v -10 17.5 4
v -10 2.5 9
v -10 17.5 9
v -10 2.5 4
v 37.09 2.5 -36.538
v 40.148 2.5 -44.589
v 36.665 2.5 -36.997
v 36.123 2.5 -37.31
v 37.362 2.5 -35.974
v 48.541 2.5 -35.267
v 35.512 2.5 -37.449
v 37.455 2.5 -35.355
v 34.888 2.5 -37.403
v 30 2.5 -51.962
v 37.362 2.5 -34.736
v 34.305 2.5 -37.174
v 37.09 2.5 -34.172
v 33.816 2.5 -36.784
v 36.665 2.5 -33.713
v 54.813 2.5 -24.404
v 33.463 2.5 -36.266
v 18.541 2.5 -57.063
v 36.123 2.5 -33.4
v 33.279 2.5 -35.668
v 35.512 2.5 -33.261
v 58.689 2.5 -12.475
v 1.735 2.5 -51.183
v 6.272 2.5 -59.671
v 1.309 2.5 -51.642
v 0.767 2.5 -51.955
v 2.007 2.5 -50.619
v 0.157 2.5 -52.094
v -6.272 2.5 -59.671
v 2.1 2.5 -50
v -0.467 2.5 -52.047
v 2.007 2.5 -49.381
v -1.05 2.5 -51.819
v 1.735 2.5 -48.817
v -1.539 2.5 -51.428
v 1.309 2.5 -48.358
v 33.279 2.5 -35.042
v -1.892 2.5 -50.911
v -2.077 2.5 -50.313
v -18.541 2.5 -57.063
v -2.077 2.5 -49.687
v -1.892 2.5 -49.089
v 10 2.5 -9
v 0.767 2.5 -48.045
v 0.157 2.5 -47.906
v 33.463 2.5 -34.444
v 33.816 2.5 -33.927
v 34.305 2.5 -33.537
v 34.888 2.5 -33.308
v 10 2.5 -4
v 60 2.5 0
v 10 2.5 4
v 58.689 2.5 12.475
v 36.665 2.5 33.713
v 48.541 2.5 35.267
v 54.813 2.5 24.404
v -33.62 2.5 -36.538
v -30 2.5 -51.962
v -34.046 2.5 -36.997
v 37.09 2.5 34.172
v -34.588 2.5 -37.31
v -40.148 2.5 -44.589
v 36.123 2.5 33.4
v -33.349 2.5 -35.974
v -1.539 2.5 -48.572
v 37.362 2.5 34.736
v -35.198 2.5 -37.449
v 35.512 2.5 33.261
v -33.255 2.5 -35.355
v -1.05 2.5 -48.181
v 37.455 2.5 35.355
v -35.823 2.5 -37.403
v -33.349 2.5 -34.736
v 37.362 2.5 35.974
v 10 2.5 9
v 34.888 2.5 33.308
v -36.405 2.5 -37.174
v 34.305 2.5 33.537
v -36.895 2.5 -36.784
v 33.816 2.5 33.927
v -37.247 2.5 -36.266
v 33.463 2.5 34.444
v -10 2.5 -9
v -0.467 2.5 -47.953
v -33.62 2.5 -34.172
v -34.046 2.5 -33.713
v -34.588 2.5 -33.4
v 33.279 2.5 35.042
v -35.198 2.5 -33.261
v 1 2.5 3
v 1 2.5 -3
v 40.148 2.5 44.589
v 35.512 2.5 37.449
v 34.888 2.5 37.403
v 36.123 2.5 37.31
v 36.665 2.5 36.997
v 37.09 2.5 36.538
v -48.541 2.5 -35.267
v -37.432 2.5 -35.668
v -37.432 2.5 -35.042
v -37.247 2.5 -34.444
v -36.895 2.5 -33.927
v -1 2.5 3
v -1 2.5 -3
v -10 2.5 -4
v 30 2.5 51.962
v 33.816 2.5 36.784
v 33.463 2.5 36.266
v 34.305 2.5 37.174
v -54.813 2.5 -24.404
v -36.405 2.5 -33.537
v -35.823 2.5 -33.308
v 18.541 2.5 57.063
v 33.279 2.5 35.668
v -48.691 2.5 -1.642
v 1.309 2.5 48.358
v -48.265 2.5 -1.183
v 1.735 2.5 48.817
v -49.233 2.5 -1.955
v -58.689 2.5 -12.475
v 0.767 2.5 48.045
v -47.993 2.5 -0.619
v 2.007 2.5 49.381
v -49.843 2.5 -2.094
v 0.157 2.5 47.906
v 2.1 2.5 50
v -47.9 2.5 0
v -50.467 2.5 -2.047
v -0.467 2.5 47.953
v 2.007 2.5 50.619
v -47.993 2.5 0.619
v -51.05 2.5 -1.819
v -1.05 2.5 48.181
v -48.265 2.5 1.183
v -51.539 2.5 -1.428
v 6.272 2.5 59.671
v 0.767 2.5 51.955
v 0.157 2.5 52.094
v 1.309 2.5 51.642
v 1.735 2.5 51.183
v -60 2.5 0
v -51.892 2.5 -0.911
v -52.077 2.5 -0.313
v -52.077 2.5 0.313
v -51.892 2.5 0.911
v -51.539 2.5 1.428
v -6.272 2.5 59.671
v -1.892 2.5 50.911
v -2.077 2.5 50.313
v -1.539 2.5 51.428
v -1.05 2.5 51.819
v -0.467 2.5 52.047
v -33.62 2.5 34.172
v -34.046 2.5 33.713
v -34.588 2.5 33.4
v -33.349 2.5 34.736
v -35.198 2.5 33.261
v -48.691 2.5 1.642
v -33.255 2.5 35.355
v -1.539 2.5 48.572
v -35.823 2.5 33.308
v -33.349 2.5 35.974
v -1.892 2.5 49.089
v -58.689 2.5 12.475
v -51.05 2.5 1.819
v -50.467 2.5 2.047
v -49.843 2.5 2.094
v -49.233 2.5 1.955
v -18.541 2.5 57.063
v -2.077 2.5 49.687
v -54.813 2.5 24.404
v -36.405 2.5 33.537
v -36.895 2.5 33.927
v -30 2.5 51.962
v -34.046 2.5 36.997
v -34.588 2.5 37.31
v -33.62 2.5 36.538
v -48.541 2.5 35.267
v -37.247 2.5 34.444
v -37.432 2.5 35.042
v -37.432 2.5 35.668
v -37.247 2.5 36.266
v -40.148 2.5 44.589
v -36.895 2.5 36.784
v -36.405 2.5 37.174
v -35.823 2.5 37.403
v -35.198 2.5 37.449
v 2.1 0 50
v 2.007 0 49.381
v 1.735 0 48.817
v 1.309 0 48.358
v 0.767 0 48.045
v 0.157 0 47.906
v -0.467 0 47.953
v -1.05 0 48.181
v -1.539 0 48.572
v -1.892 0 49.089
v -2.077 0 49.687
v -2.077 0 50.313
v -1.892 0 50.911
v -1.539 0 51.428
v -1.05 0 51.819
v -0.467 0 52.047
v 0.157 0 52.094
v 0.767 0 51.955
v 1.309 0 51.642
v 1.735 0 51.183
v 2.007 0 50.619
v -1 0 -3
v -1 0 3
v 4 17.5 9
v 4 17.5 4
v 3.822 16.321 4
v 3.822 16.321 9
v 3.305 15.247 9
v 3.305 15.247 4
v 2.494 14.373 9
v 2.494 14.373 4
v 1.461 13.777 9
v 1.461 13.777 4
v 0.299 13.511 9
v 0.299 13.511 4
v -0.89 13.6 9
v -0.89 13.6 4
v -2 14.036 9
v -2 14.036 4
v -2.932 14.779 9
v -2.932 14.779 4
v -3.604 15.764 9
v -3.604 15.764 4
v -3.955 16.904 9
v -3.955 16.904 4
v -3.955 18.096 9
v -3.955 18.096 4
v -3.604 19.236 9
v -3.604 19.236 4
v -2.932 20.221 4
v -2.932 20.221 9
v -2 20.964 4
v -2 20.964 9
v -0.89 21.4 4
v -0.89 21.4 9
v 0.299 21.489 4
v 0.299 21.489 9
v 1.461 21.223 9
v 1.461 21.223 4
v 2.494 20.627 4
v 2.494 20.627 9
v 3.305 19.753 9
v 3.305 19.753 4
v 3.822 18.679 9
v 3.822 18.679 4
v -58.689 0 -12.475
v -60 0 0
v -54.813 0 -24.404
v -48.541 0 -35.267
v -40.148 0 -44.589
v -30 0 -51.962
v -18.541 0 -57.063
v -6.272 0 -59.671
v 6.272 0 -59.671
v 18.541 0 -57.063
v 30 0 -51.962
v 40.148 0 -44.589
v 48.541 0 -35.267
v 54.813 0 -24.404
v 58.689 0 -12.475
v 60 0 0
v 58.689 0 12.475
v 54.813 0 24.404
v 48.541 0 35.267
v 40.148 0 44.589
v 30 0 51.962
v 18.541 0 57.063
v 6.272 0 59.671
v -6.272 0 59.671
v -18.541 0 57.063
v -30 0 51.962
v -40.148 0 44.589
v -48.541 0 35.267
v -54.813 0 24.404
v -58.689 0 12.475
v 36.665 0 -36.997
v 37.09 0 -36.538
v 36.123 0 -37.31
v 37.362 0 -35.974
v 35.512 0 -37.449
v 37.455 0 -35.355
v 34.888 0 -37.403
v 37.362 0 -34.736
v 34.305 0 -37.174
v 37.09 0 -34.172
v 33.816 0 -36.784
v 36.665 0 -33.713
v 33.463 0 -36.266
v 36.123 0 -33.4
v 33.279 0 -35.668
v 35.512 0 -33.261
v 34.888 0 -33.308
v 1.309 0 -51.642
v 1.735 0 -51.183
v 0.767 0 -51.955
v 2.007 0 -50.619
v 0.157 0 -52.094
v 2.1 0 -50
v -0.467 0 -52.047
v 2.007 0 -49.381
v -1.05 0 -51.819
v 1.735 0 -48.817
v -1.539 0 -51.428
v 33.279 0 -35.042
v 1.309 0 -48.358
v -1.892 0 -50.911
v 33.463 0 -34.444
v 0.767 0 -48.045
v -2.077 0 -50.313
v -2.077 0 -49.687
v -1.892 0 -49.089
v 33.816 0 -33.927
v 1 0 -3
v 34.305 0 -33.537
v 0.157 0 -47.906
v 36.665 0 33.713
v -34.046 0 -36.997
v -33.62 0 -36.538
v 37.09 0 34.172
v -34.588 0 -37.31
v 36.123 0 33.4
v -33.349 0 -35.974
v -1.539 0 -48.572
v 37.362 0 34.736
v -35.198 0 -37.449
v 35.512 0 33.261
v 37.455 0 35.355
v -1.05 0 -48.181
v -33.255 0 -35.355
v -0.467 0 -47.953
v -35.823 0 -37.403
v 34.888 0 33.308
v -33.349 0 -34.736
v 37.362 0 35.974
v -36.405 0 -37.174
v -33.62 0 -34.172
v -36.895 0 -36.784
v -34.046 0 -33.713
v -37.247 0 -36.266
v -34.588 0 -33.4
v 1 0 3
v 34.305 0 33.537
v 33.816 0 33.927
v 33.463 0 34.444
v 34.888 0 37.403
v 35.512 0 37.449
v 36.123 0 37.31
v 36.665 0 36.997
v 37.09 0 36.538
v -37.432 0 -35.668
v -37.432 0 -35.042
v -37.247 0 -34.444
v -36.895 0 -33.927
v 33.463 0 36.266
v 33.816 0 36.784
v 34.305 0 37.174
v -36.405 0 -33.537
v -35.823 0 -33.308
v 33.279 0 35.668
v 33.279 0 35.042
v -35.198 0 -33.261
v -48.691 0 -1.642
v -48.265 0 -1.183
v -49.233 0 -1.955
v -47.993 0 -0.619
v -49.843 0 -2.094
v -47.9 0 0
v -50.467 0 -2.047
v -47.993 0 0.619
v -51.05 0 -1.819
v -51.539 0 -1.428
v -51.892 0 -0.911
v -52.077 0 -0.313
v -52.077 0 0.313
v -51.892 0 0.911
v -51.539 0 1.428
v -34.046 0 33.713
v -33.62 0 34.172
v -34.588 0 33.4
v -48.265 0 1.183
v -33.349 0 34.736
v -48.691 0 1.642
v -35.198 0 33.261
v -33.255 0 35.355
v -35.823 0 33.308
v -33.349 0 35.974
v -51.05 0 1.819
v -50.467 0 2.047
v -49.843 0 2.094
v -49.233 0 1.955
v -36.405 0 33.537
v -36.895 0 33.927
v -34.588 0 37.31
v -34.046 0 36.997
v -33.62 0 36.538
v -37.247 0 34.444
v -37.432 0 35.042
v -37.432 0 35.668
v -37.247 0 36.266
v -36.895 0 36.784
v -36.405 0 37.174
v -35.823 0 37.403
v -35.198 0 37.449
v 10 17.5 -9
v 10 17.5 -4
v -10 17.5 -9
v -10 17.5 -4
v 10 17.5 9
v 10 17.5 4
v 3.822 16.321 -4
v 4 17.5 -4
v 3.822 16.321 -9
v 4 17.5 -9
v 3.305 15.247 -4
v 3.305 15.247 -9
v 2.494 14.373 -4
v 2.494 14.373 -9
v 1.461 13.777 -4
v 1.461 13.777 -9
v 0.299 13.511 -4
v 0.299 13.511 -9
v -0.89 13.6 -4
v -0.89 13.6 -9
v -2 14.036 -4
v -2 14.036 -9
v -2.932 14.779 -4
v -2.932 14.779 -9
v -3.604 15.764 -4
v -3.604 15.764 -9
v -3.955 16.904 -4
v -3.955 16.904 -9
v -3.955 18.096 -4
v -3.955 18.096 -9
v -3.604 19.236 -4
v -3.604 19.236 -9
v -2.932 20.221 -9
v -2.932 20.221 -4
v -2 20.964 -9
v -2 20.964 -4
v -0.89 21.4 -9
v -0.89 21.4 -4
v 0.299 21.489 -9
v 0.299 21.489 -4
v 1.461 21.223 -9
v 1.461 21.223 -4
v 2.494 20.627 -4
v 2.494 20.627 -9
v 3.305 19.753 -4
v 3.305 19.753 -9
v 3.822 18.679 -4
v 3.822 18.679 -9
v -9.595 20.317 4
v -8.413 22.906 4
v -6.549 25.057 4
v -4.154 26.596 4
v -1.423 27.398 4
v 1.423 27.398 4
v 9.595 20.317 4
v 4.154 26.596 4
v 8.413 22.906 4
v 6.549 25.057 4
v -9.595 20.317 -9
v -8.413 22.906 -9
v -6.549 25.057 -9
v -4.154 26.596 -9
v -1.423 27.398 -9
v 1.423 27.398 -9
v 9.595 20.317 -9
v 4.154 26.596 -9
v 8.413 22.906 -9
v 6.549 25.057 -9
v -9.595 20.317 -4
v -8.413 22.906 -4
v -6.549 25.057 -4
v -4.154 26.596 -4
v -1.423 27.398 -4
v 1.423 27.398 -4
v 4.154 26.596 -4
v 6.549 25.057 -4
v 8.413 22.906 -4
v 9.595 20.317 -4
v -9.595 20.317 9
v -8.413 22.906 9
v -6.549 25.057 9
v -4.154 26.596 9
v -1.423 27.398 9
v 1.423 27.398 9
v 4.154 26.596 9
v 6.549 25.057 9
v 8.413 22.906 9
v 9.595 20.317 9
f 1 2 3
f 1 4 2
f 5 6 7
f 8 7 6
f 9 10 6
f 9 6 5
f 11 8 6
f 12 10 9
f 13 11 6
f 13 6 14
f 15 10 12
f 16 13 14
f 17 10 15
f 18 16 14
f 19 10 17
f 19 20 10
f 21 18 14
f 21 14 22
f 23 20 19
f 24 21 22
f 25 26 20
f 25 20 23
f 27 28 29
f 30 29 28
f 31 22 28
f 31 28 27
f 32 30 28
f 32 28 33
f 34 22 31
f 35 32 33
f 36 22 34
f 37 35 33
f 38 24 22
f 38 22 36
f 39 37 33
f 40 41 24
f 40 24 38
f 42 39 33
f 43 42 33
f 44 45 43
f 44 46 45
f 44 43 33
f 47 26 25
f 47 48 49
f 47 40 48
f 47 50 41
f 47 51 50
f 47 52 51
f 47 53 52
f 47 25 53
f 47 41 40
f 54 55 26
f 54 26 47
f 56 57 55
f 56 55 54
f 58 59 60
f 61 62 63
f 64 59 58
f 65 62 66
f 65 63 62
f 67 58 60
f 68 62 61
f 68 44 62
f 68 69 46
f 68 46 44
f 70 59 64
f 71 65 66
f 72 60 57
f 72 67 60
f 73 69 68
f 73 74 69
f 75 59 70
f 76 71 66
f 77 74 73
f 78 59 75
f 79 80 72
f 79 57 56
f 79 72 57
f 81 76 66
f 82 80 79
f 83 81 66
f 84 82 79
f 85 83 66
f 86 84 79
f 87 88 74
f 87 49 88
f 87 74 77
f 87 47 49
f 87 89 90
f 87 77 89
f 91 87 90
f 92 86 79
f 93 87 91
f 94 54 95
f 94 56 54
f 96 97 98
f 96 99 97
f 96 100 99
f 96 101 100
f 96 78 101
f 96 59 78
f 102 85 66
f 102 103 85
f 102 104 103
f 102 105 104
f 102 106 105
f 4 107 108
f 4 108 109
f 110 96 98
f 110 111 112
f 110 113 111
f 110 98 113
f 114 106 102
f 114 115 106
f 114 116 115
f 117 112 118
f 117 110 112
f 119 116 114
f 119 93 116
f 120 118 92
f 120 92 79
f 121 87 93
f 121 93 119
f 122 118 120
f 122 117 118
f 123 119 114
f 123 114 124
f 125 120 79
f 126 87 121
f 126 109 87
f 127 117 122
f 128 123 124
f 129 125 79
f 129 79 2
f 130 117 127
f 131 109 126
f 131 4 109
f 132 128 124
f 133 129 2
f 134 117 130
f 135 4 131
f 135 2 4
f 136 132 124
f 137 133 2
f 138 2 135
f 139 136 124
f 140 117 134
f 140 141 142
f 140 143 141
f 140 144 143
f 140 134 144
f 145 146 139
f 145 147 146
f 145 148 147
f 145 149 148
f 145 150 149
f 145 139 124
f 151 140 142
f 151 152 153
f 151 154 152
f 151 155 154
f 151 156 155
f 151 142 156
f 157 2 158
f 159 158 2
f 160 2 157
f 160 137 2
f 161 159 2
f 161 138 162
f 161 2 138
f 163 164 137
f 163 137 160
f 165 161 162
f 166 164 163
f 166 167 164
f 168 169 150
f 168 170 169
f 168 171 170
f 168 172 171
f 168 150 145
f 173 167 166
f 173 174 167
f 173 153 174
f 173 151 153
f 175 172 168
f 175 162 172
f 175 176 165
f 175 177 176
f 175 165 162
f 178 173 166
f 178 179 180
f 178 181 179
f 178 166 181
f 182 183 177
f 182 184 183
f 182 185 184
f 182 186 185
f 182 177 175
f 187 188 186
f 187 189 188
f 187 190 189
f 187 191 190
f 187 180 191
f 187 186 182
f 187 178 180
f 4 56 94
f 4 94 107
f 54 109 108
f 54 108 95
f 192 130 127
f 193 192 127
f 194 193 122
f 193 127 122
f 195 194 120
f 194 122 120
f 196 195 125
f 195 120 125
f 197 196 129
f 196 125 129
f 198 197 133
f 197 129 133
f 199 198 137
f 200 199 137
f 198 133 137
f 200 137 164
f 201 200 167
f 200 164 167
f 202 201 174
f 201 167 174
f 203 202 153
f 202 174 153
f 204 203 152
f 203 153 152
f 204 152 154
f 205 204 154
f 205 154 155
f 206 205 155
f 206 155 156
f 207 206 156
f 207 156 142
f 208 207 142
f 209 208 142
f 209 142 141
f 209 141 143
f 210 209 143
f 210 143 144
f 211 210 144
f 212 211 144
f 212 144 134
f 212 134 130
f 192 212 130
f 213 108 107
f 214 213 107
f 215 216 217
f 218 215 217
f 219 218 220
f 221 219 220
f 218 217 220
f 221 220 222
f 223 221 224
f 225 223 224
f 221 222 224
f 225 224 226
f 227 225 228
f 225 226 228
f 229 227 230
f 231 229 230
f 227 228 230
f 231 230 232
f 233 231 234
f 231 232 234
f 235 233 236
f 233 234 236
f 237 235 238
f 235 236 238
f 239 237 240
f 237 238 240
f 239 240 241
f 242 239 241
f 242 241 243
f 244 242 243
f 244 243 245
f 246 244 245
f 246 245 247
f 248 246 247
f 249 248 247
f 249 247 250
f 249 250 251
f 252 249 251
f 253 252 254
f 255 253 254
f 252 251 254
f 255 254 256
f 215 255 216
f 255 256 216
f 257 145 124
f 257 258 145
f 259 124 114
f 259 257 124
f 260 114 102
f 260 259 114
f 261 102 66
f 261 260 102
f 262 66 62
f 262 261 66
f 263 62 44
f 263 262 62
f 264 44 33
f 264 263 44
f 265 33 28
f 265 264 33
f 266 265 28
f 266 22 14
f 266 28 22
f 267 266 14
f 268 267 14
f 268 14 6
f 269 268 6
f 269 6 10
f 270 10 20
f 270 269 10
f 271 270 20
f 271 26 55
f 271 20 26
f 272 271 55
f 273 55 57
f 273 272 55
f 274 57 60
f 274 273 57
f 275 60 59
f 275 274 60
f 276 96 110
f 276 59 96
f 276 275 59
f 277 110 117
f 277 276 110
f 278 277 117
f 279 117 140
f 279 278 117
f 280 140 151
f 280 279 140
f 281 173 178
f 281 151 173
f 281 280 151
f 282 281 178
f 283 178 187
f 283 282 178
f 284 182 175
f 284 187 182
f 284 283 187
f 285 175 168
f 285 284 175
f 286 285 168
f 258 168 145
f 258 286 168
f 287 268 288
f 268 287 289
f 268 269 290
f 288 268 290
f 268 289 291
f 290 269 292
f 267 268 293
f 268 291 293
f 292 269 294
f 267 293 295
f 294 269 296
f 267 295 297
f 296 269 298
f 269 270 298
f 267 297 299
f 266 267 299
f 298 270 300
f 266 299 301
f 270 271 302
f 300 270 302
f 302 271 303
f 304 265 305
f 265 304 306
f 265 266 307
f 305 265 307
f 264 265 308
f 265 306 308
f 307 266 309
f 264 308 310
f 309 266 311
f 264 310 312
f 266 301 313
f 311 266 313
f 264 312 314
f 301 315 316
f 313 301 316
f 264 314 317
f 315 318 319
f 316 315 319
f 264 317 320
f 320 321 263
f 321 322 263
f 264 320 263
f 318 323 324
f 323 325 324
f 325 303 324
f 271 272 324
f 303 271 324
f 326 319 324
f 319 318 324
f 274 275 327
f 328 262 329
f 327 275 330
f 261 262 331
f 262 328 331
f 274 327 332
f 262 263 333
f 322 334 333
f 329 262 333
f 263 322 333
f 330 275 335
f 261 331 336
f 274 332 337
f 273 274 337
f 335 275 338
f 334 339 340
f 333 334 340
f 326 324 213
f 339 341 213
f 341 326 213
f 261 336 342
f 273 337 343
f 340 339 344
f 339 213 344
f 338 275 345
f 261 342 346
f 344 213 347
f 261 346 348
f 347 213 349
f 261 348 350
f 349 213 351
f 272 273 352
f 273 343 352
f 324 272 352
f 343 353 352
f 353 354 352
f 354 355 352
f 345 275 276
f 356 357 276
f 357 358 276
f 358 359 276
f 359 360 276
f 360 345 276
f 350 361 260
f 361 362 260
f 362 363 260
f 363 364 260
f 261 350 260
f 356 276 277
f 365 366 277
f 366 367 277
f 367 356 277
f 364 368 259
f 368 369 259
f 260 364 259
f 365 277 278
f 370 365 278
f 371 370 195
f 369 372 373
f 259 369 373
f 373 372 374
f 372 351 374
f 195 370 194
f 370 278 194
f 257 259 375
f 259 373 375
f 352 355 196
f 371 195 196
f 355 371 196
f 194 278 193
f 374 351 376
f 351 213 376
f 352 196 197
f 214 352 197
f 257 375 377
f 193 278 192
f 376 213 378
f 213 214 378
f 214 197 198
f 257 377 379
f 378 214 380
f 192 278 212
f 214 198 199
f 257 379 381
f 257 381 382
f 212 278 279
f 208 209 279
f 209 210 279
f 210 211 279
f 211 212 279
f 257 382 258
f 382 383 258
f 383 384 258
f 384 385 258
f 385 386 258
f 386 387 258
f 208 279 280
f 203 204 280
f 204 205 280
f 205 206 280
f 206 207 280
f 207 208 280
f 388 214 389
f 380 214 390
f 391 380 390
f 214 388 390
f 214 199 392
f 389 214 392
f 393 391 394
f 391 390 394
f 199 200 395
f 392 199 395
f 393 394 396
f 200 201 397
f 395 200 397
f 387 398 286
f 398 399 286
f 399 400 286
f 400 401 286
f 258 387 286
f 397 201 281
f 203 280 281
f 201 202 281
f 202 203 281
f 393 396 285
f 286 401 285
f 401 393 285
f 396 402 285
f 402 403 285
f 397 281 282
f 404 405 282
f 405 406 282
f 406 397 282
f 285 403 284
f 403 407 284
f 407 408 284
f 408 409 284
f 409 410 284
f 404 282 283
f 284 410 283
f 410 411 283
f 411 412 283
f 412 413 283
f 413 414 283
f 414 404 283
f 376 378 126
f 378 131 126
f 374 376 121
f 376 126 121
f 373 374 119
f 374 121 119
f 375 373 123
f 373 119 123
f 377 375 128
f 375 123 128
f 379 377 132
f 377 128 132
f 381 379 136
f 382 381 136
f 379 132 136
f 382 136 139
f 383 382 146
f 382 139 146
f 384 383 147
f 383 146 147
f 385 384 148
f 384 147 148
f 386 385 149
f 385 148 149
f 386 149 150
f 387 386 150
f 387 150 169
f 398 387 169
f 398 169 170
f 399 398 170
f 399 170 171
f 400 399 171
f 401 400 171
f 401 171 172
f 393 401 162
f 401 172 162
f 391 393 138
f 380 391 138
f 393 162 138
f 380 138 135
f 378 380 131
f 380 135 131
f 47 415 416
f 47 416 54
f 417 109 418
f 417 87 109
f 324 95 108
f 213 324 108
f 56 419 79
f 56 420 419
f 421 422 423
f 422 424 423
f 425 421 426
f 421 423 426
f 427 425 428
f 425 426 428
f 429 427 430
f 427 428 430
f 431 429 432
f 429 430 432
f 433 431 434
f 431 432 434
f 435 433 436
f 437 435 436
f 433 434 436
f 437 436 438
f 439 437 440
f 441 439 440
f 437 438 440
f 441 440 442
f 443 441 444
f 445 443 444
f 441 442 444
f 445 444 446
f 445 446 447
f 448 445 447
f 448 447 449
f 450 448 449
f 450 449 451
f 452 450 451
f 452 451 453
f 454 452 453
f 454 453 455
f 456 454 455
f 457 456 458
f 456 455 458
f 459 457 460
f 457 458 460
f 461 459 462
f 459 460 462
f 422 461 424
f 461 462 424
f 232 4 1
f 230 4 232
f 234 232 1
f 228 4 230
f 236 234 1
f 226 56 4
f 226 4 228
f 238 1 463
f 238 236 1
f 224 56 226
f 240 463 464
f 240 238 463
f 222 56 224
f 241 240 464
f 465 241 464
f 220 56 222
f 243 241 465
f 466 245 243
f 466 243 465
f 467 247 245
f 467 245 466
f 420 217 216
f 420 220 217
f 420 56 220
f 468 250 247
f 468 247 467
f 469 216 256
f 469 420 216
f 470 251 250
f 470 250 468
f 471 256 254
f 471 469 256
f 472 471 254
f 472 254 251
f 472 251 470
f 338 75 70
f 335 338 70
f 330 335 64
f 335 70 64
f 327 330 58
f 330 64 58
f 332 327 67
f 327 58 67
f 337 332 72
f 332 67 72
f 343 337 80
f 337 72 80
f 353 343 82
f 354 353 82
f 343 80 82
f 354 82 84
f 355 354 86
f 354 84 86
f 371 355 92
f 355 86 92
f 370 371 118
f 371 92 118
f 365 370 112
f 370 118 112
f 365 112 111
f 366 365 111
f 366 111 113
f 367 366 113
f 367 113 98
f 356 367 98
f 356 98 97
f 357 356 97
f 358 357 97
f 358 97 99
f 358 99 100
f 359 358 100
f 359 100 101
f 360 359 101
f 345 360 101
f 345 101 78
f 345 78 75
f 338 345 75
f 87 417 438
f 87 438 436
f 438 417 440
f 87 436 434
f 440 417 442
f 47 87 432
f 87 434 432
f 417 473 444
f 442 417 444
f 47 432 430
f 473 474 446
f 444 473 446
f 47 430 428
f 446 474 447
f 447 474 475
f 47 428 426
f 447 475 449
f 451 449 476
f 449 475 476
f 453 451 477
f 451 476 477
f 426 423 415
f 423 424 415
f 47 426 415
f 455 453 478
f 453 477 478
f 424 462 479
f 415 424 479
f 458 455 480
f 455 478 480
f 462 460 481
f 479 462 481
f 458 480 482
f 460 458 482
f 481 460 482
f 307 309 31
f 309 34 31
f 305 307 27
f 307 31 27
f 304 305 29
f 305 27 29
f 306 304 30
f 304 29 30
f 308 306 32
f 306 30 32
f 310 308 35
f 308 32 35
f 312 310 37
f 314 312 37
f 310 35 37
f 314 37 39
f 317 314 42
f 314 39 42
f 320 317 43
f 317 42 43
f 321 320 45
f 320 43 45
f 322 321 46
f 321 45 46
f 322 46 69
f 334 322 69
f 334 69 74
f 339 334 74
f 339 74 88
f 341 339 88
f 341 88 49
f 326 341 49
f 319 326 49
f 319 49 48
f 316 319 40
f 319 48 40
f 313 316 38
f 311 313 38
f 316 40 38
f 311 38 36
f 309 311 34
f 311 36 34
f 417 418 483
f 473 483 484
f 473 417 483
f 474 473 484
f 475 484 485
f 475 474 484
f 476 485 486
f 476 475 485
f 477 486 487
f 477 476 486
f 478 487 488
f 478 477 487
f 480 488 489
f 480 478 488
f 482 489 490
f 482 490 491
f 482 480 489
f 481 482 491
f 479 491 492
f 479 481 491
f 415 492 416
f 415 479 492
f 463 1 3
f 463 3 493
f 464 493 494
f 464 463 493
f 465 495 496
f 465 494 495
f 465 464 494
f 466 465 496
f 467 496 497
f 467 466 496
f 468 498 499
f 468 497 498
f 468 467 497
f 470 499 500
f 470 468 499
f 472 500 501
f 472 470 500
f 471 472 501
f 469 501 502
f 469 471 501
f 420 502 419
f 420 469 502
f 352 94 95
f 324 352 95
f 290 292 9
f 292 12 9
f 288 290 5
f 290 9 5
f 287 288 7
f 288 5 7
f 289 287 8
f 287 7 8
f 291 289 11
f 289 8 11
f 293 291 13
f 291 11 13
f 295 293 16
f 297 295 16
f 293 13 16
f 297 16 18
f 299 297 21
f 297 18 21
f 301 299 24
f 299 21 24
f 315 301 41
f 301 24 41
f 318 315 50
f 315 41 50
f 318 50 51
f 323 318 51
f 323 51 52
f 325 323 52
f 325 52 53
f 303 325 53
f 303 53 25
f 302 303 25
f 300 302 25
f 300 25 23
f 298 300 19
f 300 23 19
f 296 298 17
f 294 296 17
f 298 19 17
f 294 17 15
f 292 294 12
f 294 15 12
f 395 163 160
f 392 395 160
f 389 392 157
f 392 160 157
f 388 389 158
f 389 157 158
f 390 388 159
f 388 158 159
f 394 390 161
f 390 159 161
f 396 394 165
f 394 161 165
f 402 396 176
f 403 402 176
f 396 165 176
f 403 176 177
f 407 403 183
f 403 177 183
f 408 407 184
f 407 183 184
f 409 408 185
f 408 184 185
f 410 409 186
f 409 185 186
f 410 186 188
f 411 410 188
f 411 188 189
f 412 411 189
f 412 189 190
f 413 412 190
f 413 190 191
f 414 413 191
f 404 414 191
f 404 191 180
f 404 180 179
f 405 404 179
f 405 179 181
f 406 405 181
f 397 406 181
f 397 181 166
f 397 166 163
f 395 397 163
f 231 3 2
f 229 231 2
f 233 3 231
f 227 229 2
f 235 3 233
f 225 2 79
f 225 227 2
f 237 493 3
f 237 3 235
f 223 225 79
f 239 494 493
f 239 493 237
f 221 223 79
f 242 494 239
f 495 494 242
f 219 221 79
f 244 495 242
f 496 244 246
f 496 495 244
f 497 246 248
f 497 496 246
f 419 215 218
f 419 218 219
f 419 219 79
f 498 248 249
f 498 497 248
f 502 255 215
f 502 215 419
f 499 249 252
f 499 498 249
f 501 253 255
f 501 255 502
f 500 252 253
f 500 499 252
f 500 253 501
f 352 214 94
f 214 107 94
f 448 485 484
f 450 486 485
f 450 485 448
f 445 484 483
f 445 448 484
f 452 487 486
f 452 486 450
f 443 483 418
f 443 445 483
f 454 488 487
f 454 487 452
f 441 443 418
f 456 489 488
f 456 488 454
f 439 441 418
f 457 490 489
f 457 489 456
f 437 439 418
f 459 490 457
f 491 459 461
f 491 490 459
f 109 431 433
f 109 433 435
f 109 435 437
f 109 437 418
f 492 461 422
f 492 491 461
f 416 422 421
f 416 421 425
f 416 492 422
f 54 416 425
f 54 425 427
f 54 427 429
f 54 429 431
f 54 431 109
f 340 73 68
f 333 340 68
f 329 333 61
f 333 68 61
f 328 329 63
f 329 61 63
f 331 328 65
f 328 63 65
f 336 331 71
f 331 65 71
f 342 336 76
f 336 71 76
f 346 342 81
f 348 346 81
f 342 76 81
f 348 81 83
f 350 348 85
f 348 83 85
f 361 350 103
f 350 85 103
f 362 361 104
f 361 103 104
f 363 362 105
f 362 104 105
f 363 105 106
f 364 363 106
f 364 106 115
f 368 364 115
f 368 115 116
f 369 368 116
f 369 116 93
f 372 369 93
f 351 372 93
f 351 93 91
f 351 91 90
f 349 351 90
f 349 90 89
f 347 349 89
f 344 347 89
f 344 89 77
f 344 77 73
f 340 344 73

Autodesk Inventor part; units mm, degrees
ref_plane "YZ Plane" through (0, 0, 0) normal (1, 0, 0) x (0, 1, 0)
ref_plane "XZ Plane" through (0, 0, 0) normal (0, 1, 0) x (-1, 0, 0)
ref_plane "XY Plane" through (0, 0, 0) normal (0, 0, 1) x (1, 0, 0)
sketch "Sketch1" plane through (0, 0, 0) normal (0, 1, 0) x (-1, 0, 0)
  circle A0 centre (0, 0) radius 60
  dimension "d0" = 120
extrude "Extrusion1" add sketch "Sketch1" along normal blind 2.5
sketch "Sketch2" plane through (0, 0, 0) normal (0, 0, 1) x (1, 0, 0)
  line L0 (60, 2.5) -> (-60, 2.5) projected
  line L1 (-10, 17.5) -> (-4, 17.5)
  line L2 (10, 17.5) -> (10, 2.5)
  line L3 (10, 2.5) -> (-10, 2.5)
  line L4 (-10, 2.5) -> (-10, 17.5)
  circle A0 centre (0, 17.5) radius 10
  circle A1 centre (0, 17.5) radius 4
  line L5 (4, 17.5) -> (10, 17.5)
  line L6 (-4, 17.5) -> (4, 17.5)
  point P0 (0, 0)
  point P1 (0, 2.5)
  dimension "d3" = 20
  dimension "d4" = 15
  dimension "d5" = 8
extrude "Extrusion2" add sketch "Sketch2" along normal mid plane 18 contours L0 L4 A0 L2 | L5 A1 L1 A0 | A0 L1 A1 L5
sketch "Sketch4" plane through (10, 2.5, 9) normal (1, 0, 0) x (0, 0, -1)
  line L0 (18, 15) -> (0, 15) projected
  line L1 (18, 15) -> (18, 15) projected
  line L2 (0, 15) -> (18, 15) projected
  line L3 (0, 15) -> (0, 15) projected
  line L4 (18, 15) -> (0, 15) projected
  line L5 (0, 0) -> (0, 15) projected
  line L6 (18, 0) -> (0, 0) projected
  line L7 (18, 15) -> (18, 0) projected
  line L8 (5, 25) -> (13, 25)
  line L9 (13, 25) -> (13, 0)
  line L10 (13, 0) -> (5, 0)
  line L11 (5, 0) -> (5, 25)
  line L12 (69, 0) -> (-51, 0) projected
  point P0 (9, -2.5)
  point P1 (9, 0)
  dimension "d8" = 8
  dimension "d9" = 25
extrude "Extrusion3" cut sketch "Sketch4" against normal blind 20 contours L9 L6 L11 L0 | L0 L11 L8 L9
sketch "Sketch5" plane through (0, 2.5, 0) normal (0, 1, 0) x (1, 0, 0)
  line L0 (10, -4) -> (10, -9) projected
  line L1 (10, -9) -> (-10, -9) projected
  line L2 (-10, -9) -> (-10, -4) projected
  line L3 (10, -4) -> (-10, -4) projected
  line L4 (10, 4) -> (-10, 4) projected
  line L5 (-10, 4) -> (-10, 9) projected
  line L6 (-10, 9) -> (10, 9) projected
  line L7 (10, 9) -> (10, 4) projected
  circle A0 centre (0, 0) radius 60 projected
  line L8 (1, 3) -> (-1, 3)
  line L9 (-1, 3) -> (-1, -3)
  line L10 (-1, -3) -> (1, -3)
  line L11 (1, -3) -> (1, 3)
  line L12 (-1, -3) -> (1, 3) construction
  line L13 (-1, 3) -> (1, -3) construction
  line L14 (0, 0) -> (50, 0) construction
  line L15 (0, 0) -> (50, 0) construction
  line L16 (0, 0) -> (35.3553, 35.3553) construction
  line L17 (0, 0) -> (50, 0) construction
  line L18 (0, 0) -> (0, 50) construction
  line L19 (0, 0) -> (50, 0) construction
  line L20 (0, 0) -> (-35.3553, 35.3553) construction
  line L21 (0, 0) -> (50, 0) construction
  line L22 (0, 0) -> (-50, 0) construction
  line L23 (0, 0) -> (50, 0) construction
  line L24 (0, 0) -> (-35.3553, -35.3553) construction
  line L25 (0, 0) -> (50, 0) construction
  line L26 (0, 0) -> (0, -50) construction
  line L27 (0, 0) -> (50, 0) construction
  line L28 (0, 0) -> (35.3553, -35.3553) construction
  line L29 (0, 0) -> (50, 0) construction
  circle A1 centre (0, -50) radius 2.1
  circle A2 centre (35.3553, -35.3553) radius 2.1
  circle A3 centre (50, 0) radius 2.1
  circle A4 centre (35.3553, 35.3553) radius 2.1
  circle A5 centre (0, 50) radius 2.1
  circle A6 centre (-35.3553, 35.3553) radius 2.1
  circle A7 centre (-50, 0) radius 2.1
  circle A8 centre (-35.3553, -35.3553) radius 2.1
  point P0 (0, 0)
  dimension "d13" = 120
  dimension "d17" = 6
  dimension "d18" = 2
  dimension "d19" = 50
  dimension "d20" = 0
  dimension "d21" = 50
  dimension "d22" = 45
  dimension "d23" = 50
  dimension "d24" = 90
  dimension "d25" = 50
  dimension "d26" = 135
  dimension "d27" = 50
  dimension "d28" = 180
  dimension "d29" = 50
  dimension "d30" = 135
  dimension "d31" = 50
  dimension "d32" = 90
  dimension "d33" = 50
  dimension "d34" = 45
  dimension "d35" = 4.2
  dimension "d36" = 4.2
  dimension "d37" = 4.2
  dimension "d38" = 4.2
  dimension "d39" = 4.2
  dimension "d40" = 4.2
  dimension "d41" = 4.2
  dimension "d42" = 4.2
extrude "Extrusion4" cut sketch "Sketch5" against normal blind 20 contours L11 L10 L9 L8 | A1 | A2 | A4 | A5 | A6 | A7 | A8
equation "\"d36\" = d35"
equation "\"d37\" = d36"
equation "\"d38\" = d37"
equation "\"d39\" = d38"
equation "\"d40\" = d39"
equation "\"d41\" = d40"
equation "\"d42\" = d41"
properties part number "Base top" material "ABS Plastic"
